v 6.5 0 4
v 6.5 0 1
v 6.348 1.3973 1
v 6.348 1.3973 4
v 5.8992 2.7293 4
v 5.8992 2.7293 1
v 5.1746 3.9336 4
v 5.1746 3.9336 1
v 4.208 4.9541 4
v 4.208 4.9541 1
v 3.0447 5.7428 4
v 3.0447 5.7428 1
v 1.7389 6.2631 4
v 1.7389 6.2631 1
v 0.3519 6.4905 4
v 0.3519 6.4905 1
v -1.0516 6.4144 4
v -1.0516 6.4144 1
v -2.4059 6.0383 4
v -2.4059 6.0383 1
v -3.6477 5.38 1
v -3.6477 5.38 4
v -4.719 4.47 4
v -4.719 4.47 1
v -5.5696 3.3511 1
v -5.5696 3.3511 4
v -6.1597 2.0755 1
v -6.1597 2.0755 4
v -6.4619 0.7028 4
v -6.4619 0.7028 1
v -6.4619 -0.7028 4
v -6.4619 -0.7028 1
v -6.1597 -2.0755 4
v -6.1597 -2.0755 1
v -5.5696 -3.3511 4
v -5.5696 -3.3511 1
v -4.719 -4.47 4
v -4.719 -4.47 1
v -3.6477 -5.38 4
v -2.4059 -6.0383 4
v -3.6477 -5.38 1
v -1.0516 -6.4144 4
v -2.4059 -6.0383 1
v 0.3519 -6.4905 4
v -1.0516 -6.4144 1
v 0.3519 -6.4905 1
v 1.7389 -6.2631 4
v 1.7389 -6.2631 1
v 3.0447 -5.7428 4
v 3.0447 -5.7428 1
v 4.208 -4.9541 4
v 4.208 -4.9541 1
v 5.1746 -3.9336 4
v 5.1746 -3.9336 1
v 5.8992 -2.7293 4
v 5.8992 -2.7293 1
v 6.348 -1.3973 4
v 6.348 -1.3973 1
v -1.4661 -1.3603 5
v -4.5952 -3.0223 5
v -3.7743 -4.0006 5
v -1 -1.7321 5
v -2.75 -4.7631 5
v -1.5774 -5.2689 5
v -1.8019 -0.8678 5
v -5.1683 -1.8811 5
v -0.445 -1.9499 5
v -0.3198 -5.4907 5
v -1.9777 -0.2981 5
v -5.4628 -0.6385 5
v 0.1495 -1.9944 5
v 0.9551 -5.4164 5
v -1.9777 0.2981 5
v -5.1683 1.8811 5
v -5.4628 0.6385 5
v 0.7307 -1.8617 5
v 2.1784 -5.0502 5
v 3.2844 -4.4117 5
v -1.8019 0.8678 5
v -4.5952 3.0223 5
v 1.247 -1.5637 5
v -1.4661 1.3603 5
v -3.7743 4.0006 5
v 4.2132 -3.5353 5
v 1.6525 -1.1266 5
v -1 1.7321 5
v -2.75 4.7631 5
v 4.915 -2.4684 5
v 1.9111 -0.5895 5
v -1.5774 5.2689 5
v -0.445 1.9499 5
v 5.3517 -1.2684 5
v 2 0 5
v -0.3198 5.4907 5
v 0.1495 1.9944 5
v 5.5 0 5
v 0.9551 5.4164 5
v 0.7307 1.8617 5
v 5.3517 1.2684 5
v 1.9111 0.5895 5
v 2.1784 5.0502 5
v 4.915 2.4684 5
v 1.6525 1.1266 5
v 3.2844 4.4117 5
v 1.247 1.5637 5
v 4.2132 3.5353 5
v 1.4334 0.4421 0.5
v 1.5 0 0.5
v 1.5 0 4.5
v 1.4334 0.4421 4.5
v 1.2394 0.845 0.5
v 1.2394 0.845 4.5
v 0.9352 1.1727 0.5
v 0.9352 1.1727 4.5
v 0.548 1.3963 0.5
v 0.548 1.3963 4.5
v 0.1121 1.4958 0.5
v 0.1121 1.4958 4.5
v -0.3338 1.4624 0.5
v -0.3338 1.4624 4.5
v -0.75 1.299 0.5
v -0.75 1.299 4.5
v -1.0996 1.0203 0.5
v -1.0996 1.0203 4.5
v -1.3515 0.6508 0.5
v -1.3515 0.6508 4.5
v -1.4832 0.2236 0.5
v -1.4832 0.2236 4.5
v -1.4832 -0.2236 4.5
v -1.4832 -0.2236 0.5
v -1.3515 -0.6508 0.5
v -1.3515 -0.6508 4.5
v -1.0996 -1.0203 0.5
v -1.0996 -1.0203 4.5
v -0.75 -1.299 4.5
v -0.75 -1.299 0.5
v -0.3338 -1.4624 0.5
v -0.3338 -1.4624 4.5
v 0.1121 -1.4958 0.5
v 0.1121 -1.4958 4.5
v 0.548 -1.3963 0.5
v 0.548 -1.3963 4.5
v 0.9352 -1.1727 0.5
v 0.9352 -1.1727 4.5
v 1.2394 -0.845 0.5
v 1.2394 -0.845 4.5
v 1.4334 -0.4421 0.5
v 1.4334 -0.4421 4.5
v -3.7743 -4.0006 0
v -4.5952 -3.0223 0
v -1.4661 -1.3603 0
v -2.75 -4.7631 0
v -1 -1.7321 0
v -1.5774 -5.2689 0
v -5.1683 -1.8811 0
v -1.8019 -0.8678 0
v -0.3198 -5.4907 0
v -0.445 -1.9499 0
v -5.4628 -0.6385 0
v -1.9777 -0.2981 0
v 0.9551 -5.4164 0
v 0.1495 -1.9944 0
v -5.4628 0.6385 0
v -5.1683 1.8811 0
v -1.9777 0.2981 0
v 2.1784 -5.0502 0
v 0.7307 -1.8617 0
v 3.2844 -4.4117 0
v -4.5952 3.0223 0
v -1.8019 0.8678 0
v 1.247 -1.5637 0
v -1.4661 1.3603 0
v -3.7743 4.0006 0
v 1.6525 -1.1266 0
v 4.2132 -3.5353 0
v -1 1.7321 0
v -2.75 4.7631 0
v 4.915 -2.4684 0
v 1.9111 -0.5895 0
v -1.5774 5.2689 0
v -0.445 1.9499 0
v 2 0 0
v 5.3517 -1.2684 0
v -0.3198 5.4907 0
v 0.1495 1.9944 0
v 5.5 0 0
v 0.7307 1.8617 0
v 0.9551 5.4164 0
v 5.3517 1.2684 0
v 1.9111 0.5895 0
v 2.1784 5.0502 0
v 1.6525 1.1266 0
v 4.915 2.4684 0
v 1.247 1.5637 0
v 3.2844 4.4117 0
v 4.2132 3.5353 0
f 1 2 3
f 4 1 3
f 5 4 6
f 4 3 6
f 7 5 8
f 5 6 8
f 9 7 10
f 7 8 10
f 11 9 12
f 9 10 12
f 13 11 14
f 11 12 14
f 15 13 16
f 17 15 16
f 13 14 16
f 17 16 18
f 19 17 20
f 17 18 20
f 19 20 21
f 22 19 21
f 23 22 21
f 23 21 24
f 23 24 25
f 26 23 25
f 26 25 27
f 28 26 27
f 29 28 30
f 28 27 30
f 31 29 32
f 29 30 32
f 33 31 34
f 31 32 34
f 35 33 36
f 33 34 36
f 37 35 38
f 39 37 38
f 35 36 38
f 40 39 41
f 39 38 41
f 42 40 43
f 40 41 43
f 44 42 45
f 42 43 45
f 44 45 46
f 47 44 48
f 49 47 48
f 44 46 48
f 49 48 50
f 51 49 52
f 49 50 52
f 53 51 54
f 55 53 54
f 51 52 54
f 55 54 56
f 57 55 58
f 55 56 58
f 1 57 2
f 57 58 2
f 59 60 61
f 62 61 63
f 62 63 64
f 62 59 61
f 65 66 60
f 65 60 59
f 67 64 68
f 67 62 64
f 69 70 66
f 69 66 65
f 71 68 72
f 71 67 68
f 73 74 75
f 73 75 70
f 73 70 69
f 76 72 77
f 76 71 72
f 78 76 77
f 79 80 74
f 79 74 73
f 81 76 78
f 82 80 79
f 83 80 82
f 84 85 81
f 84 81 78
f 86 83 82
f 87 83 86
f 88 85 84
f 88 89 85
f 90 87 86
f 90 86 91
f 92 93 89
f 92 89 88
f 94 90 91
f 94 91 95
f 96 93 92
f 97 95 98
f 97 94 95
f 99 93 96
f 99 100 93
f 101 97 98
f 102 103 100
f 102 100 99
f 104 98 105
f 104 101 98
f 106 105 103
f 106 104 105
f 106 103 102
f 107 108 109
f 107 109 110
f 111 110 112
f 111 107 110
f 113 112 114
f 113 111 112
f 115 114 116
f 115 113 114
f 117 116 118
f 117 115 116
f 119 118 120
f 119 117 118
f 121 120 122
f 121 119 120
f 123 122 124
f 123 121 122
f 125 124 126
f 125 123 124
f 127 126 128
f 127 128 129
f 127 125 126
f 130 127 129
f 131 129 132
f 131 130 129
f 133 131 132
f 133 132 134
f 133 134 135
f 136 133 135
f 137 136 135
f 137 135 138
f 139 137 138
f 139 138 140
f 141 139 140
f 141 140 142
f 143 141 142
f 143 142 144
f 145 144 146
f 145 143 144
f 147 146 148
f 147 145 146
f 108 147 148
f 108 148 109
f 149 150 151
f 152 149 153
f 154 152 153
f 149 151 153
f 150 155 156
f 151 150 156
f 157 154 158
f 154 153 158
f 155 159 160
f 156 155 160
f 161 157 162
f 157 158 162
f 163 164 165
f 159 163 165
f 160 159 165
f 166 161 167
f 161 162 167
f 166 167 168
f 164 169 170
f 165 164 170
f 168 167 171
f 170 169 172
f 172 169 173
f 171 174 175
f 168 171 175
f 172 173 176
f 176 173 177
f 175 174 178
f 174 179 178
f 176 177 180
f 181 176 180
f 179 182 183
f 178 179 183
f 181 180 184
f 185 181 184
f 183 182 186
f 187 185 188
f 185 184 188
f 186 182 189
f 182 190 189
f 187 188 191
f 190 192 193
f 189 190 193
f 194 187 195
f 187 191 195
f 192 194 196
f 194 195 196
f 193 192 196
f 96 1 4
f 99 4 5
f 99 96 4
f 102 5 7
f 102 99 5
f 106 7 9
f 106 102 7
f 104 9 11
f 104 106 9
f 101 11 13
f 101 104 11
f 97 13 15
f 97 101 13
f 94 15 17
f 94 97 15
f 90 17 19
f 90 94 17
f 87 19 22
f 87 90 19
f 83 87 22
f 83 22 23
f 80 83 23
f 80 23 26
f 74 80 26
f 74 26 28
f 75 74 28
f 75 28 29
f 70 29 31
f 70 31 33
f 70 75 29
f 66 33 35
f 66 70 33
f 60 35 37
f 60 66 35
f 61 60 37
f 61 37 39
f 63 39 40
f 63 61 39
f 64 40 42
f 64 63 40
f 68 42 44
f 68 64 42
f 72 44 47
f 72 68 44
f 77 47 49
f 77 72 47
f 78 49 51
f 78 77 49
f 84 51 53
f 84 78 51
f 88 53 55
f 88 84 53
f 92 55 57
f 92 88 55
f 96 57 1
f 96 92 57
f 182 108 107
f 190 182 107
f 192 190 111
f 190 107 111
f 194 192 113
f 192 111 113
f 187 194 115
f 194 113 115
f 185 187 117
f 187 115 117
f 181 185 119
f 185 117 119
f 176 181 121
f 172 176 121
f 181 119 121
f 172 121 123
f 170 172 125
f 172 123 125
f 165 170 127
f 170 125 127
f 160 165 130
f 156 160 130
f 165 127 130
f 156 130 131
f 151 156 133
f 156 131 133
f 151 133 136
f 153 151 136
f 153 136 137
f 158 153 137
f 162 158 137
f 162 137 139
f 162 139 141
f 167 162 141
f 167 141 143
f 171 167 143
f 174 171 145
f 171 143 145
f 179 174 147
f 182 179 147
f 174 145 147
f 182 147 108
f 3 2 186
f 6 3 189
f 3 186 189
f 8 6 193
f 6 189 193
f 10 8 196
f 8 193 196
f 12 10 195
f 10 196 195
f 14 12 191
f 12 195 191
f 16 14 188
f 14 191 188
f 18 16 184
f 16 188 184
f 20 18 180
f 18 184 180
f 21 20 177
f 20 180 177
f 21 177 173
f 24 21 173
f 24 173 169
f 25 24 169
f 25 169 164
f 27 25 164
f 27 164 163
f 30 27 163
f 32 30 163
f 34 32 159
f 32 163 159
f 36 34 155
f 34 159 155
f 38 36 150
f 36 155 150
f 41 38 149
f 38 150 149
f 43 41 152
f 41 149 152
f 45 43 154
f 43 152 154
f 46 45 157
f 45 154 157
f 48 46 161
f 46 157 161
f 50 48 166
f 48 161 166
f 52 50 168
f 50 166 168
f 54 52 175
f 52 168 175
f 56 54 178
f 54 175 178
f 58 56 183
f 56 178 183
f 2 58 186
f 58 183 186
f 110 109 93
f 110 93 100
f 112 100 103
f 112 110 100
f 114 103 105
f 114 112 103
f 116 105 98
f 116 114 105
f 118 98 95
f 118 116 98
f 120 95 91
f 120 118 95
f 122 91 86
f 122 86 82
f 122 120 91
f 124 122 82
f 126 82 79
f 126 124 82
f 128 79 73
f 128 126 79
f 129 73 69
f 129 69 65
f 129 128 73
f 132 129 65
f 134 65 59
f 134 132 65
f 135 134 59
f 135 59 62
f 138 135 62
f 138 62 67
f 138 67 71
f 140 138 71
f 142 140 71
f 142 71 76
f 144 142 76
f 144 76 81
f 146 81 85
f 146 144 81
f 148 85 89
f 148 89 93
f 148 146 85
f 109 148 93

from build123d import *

# Parameters (mm, degrees)
SKETCH_1_R      = 6.5
SKETCH_1_R_2    = 1.5
EXTRUDE_1_DEPTH = 5
CHAMFER_1_SIZE  = 1
CHAMFER_2_SIZE  = 0.5


with BuildPart() as part:
    # 草图1 → 凸台-拉伸1 (new body)
    with BuildSketch(Plane.XY):
        Circle(SKETCH_1_R)
        Circle(SKETCH_1_R_2, mode=Mode.SUBTRACT)
    extrude(amount=EXTRUDE_1_DEPTH)

    # 倒角1
    chamfer_1_edges = [part.edges().sort_by_distance(p)[0] for p in [
        (-6.5, 0, 0),
        (-6.5, 0, 5),
    ]]
    chamfer(chamfer_1_edges, length=CHAMFER_1_SIZE)

    # 倒角2
    chamfer_2_edges = [part.edges().sort_by_distance(p)[0] for p in [
        (-1.5, 0, 0),
        (-1.5, 0, 5),
    ]]
    chamfer(chamfer_2_edges, length=CHAMFER_2_SIZE)


solid = part.part
